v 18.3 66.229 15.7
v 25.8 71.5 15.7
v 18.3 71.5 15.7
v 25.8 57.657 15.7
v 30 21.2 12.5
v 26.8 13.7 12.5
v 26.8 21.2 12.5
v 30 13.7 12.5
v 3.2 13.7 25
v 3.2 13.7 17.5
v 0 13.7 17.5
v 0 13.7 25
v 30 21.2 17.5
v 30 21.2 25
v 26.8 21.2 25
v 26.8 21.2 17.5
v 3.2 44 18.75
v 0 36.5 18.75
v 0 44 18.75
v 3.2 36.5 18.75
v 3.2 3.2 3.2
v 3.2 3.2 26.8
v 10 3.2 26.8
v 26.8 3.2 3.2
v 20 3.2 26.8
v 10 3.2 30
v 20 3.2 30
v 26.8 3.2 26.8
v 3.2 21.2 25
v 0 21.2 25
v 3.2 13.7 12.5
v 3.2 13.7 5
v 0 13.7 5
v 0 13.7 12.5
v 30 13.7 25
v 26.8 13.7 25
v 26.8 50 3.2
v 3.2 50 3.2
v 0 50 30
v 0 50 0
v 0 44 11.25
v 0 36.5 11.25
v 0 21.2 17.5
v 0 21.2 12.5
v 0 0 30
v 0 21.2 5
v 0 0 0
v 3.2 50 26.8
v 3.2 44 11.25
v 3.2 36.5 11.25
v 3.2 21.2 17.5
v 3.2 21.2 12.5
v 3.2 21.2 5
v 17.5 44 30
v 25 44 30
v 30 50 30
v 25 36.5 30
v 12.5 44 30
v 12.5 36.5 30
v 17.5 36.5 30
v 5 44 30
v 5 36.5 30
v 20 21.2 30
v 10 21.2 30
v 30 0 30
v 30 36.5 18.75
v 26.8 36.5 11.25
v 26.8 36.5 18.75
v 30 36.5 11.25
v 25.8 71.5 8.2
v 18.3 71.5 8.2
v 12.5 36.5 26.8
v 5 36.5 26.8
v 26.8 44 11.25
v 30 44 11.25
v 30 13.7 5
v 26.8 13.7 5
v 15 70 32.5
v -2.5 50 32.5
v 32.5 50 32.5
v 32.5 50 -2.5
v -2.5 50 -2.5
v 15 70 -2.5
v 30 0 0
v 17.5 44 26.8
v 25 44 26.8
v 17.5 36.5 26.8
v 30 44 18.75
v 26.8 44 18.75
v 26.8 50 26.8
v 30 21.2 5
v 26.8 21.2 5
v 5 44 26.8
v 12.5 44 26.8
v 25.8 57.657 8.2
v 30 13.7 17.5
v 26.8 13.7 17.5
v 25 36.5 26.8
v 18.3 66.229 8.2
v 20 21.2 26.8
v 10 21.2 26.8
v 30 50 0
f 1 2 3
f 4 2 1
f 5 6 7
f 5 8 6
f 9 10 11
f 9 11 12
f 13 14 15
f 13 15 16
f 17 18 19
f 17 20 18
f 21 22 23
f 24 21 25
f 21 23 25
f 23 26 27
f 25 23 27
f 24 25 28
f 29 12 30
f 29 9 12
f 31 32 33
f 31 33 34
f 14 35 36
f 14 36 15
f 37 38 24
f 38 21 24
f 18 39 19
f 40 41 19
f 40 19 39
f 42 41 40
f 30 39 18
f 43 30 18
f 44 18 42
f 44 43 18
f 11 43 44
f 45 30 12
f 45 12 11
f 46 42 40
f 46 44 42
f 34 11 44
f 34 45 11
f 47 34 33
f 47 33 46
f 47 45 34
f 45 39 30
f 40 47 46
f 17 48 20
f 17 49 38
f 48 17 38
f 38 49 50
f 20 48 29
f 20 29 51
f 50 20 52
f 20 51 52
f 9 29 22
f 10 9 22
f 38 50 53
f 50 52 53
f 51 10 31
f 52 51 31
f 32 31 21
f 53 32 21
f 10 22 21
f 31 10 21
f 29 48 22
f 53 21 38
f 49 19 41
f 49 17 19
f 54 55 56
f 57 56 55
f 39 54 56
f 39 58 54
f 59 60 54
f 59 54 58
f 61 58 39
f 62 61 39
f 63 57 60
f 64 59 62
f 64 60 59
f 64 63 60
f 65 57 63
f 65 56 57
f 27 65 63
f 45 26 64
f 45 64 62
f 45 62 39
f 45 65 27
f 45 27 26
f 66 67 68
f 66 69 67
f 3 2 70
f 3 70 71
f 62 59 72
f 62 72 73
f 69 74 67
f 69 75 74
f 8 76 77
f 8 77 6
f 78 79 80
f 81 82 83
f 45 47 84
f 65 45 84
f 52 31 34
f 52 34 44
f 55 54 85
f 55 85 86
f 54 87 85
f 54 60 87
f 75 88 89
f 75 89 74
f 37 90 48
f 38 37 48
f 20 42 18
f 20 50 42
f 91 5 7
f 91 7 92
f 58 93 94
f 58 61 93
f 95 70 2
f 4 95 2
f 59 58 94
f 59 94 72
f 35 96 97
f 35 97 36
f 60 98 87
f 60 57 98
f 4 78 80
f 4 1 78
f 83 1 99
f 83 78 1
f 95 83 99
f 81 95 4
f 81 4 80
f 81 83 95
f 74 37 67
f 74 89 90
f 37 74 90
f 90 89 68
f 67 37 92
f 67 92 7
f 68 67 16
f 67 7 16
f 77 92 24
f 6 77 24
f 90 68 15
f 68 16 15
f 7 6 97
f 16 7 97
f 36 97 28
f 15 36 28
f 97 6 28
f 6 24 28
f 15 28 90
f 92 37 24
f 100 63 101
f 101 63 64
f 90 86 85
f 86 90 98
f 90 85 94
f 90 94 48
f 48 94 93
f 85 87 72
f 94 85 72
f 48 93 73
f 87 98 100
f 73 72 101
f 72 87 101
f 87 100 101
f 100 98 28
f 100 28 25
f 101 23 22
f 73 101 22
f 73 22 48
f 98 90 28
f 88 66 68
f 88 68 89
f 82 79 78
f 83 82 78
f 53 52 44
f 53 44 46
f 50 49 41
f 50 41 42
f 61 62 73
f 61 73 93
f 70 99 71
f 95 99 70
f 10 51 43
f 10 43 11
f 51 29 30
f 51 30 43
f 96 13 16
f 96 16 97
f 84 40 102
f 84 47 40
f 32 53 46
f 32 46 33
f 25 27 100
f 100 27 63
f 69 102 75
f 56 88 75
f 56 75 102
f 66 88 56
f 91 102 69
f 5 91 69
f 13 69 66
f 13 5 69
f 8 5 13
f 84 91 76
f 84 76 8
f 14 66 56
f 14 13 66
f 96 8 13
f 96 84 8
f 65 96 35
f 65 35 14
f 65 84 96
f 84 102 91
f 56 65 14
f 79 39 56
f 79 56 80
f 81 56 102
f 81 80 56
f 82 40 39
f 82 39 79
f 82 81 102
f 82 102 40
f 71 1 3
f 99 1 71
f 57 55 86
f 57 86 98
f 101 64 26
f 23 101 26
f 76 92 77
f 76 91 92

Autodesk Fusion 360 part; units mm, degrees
sketch "Sketch1" plane through (0, 0, 0) normal (0, 1, 0) x (1, 0, 0)
  line L0 (0, 0) -> (30, 0)
  line L1 (30, 0) -> (30, -30)
  line L2 (30, -30) -> (0, -30)
  line L3 (0, -30) -> (0, 0)
  line L4 (3.2, -3.2) -> (26.8, -3.2)
  line L5 (26.8, -3.2) -> (26.8, -26.8)
  line L6 (26.8, -26.8) -> (3.2, -26.8)
  line L7 (3.2, -26.8) -> (3.2, -3.2)
  dimension "d1" = 30
  dimension "d2" = 30
  dimension "d3" = 3.2
  dimension "d4" = 3.2
  dimension "d5" = 3.2
  dimension "d6" = 3.2
extrude "Extrude1" add sketch "Sketch1" along normal blind 50 makes body 1
sketch "Sketch2" plane through (0, 0, 30) normal (0, 0, 1) x (1, 0, 0)
  line L0 (0, 0) -> (30, 0)
  line L1 (30, 0) -> (30, 50)
  line L2 (30, 50) -> (0, 50)
  line L3 (0, 50) -> (0, 0)
  line L4 (10, 3.2) -> (20, 3.2)
  line L5 (20, 3.2) -> (20, 21.2)
  line L6 (20, 21.2) -> (10, 21.2)
  line L7 (10, 21.2) -> (10, 3.2)
  line L8 (5, 44) -> (12.5, 44)
  line L9 (12.5, 44) -> (12.5, 36.5)
  line L10 (12.5, 36.5) -> (5, 36.5)
  line L11 (5, 36.5) -> (5, 44)
  line L12 (17.5, 44) -> (25, 44)
  line L13 (25, 44) -> (25, 36.5)
  line L14 (25, 36.5) -> (17.5, 36.5)
  line L15 (17.5, 36.5) -> (17.5, 44)
  line L16 (0, 50) -> (-2.5, 50)
  line L17 (30, 50) -> (32.5, 50)
  line L18 (-2.5, 50) -> (15, 70)
  line L19 (15, 70) -> (32.5, 50)
  dimension "d9" = 18
  dimension "d10" = 10
  dimension "d11" = 10
  dimension "d12" = 3.2
  dimension "d13" = 7.5
  dimension "d14" = 7.5
  dimension "d15" = 5
  dimension "d16" = 6
  dimension "d17" = 7.5
  dimension "d18" = 7.5
  dimension "d19" = 5
  dimension "d20" = 6
  dimension "d51" = 2.5
  dimension "d52" = 2.5
  dimension "d53" = 17.5
  dimension "d54" = 20
extrude "Extrude2" cut sketch "Sketch2" against normal blind 3.2 contours L4 L5 L6 L7 bodies 1
extrude "Extrude3" add sketch "Sketch1" along normal blind 3.2 contours L4 L5 L6 L7 bodies 1
extrude "Extrude4" cut sketch "Sketch2" against normal blind 3.2 contours L8 L9 L10 L11 | L12 L13 L14 L15 bodies 1
sketch "Sketch3" plane through (30, 0, 0) normal (1, 0, 0) x (0, 0, -1)
  line L0 (-30, 0) -> (0, 0)
  line L1 (0, 0) -> (0, 50)
  line L2 (0, 50) -> (-30, 50)
  line L3 (-30, 50) -> (-30, 0)
  line L4 (-25, 21.2) -> (-17.5, 21.2)
  line L5 (-17.5, 21.2) -> (-17.5, 13.7)
  line L6 (-17.5, 13.7) -> (-25, 13.7)
  line L7 (-25, 13.7) -> (-25, 21.2)
  line L8 (-12.5, 21.2) -> (-5, 21.2)
  line L9 (-5, 21.2) -> (-5, 13.7)
  line L10 (-5, 13.7) -> (-12.5, 13.7)
  line L11 (-12.5, 13.7) -> (-12.5, 21.2)
  line L12 (-30, 3.2) -> (-30, 21.2)
  line L13 (0, 0) -> (-30, 0)
  line L14 (-18.75, 44) -> (-11.25, 44)
  line L15 (-11.25, 44) -> (-11.25, 36.5)
  line L16 (-11.25, 36.5) -> (-18.75, 36.5)
  line L17 (-18.75, 36.5) -> (-18.75, 44)
  dimension "d27" = 7.5
  dimension "d28" = 7.5
  dimension "d29" = 5
  dimension "d30" = 5
  dimension "d31" = 7.5
  dimension "d32" = 7.5
  dimension "d33" = 13.7
  dimension "d34" = 13.7
  dimension "d35" = 6
  dimension "d36" = 7.5
  dimension "d37" = 7.5
  dimension "d38" = 11.25
extrude "Extrude5" cut sketch "Sketch3" against normal blind 30 contours L14 L15 L16 L17 bodies 1
extrude "Extrude6" cut sketch "Sketch3" against normal blind 30 contours L4 L5 L6 L7 | L8 L9 L10 L11 bodies 1
sketch "Sketch4" plane through (0, 50, 0) normal (0, 1, 0) x (-1, 0, 0)
  line L0 (-26.8, 26.8) -> (-3.2, 26.8)
  line L1 (-3.2, 26.8) -> (-3.2, 3.2)
  line L2 (-3.2, 3.2) -> (-26.8, 3.2)
  line L3 (-26.8, 3.2) -> (-26.8, 26.8)
  line L4 (0, 30) -> (-30, 30)
  line L5 (-30, 30) -> (-30, 0)
  line L6 (-30, 0) -> (0, 0)
  line L7 (0, 0) -> (0, 30)
  line L8 (2.5, -2.5) -> (-32.5, -2.5)
  line L9 (-32.5, -2.5) -> (-32.5, 32.5)
  line L10 (-32.5, 32.5) -> (2.5, 32.5)
  line L11 (2.5, 32.5) -> (2.5, -2.5)
  line L12 (0, 30) -> (0, 0)
  line L13 (0, 0) -> (-30, 0)
  line L14 (-30, 0) -> (-30, 30)
  line L15 (-30, 30) -> (0, 30)
  line L16 (-18.3, 8.2) -> (-25.8, 8.2)
  line L17 (-25.8, 8.2) -> (-25.8, 15.7)
  line L18 (-25.8, 15.7) -> (-18.3, 15.7)
  line L19 (-18.3, 15.7) -> (-18.3, 8.2)
  line L20 (-26.8, 26.8) -> (-3.2, 26.8)
  line L21 (-26.8, 3.2) -> (-26.8, 26.8)
  line L22 (-3.2, 3.2) -> (-26.8, 3.2)
  dimension "d43" = 2.5
  dimension "d44" = 2.5
  dimension "d45" = 2.5
  dimension "d46" = 2.5
  dimension "d47" = 7.5
  dimension "d48" = 7.5
  dimension "d59" = 1
  dimension "d60" = 5
extrude "Extrude7" add sketch "Sketch2" along normal blind 2.5 separate body contours L2 L16 L17 L18 L19 makes body 2
extrude "Extrude8" add sketch "Sketch2" against normal blind 32.5 contours L2 L16 L17 L18 L19 bodies 1 2
extrude "Extrude9" add sketch "Sketch4" along normal blind 21.5 contours L16 L17 L18 L19 bodies 1
